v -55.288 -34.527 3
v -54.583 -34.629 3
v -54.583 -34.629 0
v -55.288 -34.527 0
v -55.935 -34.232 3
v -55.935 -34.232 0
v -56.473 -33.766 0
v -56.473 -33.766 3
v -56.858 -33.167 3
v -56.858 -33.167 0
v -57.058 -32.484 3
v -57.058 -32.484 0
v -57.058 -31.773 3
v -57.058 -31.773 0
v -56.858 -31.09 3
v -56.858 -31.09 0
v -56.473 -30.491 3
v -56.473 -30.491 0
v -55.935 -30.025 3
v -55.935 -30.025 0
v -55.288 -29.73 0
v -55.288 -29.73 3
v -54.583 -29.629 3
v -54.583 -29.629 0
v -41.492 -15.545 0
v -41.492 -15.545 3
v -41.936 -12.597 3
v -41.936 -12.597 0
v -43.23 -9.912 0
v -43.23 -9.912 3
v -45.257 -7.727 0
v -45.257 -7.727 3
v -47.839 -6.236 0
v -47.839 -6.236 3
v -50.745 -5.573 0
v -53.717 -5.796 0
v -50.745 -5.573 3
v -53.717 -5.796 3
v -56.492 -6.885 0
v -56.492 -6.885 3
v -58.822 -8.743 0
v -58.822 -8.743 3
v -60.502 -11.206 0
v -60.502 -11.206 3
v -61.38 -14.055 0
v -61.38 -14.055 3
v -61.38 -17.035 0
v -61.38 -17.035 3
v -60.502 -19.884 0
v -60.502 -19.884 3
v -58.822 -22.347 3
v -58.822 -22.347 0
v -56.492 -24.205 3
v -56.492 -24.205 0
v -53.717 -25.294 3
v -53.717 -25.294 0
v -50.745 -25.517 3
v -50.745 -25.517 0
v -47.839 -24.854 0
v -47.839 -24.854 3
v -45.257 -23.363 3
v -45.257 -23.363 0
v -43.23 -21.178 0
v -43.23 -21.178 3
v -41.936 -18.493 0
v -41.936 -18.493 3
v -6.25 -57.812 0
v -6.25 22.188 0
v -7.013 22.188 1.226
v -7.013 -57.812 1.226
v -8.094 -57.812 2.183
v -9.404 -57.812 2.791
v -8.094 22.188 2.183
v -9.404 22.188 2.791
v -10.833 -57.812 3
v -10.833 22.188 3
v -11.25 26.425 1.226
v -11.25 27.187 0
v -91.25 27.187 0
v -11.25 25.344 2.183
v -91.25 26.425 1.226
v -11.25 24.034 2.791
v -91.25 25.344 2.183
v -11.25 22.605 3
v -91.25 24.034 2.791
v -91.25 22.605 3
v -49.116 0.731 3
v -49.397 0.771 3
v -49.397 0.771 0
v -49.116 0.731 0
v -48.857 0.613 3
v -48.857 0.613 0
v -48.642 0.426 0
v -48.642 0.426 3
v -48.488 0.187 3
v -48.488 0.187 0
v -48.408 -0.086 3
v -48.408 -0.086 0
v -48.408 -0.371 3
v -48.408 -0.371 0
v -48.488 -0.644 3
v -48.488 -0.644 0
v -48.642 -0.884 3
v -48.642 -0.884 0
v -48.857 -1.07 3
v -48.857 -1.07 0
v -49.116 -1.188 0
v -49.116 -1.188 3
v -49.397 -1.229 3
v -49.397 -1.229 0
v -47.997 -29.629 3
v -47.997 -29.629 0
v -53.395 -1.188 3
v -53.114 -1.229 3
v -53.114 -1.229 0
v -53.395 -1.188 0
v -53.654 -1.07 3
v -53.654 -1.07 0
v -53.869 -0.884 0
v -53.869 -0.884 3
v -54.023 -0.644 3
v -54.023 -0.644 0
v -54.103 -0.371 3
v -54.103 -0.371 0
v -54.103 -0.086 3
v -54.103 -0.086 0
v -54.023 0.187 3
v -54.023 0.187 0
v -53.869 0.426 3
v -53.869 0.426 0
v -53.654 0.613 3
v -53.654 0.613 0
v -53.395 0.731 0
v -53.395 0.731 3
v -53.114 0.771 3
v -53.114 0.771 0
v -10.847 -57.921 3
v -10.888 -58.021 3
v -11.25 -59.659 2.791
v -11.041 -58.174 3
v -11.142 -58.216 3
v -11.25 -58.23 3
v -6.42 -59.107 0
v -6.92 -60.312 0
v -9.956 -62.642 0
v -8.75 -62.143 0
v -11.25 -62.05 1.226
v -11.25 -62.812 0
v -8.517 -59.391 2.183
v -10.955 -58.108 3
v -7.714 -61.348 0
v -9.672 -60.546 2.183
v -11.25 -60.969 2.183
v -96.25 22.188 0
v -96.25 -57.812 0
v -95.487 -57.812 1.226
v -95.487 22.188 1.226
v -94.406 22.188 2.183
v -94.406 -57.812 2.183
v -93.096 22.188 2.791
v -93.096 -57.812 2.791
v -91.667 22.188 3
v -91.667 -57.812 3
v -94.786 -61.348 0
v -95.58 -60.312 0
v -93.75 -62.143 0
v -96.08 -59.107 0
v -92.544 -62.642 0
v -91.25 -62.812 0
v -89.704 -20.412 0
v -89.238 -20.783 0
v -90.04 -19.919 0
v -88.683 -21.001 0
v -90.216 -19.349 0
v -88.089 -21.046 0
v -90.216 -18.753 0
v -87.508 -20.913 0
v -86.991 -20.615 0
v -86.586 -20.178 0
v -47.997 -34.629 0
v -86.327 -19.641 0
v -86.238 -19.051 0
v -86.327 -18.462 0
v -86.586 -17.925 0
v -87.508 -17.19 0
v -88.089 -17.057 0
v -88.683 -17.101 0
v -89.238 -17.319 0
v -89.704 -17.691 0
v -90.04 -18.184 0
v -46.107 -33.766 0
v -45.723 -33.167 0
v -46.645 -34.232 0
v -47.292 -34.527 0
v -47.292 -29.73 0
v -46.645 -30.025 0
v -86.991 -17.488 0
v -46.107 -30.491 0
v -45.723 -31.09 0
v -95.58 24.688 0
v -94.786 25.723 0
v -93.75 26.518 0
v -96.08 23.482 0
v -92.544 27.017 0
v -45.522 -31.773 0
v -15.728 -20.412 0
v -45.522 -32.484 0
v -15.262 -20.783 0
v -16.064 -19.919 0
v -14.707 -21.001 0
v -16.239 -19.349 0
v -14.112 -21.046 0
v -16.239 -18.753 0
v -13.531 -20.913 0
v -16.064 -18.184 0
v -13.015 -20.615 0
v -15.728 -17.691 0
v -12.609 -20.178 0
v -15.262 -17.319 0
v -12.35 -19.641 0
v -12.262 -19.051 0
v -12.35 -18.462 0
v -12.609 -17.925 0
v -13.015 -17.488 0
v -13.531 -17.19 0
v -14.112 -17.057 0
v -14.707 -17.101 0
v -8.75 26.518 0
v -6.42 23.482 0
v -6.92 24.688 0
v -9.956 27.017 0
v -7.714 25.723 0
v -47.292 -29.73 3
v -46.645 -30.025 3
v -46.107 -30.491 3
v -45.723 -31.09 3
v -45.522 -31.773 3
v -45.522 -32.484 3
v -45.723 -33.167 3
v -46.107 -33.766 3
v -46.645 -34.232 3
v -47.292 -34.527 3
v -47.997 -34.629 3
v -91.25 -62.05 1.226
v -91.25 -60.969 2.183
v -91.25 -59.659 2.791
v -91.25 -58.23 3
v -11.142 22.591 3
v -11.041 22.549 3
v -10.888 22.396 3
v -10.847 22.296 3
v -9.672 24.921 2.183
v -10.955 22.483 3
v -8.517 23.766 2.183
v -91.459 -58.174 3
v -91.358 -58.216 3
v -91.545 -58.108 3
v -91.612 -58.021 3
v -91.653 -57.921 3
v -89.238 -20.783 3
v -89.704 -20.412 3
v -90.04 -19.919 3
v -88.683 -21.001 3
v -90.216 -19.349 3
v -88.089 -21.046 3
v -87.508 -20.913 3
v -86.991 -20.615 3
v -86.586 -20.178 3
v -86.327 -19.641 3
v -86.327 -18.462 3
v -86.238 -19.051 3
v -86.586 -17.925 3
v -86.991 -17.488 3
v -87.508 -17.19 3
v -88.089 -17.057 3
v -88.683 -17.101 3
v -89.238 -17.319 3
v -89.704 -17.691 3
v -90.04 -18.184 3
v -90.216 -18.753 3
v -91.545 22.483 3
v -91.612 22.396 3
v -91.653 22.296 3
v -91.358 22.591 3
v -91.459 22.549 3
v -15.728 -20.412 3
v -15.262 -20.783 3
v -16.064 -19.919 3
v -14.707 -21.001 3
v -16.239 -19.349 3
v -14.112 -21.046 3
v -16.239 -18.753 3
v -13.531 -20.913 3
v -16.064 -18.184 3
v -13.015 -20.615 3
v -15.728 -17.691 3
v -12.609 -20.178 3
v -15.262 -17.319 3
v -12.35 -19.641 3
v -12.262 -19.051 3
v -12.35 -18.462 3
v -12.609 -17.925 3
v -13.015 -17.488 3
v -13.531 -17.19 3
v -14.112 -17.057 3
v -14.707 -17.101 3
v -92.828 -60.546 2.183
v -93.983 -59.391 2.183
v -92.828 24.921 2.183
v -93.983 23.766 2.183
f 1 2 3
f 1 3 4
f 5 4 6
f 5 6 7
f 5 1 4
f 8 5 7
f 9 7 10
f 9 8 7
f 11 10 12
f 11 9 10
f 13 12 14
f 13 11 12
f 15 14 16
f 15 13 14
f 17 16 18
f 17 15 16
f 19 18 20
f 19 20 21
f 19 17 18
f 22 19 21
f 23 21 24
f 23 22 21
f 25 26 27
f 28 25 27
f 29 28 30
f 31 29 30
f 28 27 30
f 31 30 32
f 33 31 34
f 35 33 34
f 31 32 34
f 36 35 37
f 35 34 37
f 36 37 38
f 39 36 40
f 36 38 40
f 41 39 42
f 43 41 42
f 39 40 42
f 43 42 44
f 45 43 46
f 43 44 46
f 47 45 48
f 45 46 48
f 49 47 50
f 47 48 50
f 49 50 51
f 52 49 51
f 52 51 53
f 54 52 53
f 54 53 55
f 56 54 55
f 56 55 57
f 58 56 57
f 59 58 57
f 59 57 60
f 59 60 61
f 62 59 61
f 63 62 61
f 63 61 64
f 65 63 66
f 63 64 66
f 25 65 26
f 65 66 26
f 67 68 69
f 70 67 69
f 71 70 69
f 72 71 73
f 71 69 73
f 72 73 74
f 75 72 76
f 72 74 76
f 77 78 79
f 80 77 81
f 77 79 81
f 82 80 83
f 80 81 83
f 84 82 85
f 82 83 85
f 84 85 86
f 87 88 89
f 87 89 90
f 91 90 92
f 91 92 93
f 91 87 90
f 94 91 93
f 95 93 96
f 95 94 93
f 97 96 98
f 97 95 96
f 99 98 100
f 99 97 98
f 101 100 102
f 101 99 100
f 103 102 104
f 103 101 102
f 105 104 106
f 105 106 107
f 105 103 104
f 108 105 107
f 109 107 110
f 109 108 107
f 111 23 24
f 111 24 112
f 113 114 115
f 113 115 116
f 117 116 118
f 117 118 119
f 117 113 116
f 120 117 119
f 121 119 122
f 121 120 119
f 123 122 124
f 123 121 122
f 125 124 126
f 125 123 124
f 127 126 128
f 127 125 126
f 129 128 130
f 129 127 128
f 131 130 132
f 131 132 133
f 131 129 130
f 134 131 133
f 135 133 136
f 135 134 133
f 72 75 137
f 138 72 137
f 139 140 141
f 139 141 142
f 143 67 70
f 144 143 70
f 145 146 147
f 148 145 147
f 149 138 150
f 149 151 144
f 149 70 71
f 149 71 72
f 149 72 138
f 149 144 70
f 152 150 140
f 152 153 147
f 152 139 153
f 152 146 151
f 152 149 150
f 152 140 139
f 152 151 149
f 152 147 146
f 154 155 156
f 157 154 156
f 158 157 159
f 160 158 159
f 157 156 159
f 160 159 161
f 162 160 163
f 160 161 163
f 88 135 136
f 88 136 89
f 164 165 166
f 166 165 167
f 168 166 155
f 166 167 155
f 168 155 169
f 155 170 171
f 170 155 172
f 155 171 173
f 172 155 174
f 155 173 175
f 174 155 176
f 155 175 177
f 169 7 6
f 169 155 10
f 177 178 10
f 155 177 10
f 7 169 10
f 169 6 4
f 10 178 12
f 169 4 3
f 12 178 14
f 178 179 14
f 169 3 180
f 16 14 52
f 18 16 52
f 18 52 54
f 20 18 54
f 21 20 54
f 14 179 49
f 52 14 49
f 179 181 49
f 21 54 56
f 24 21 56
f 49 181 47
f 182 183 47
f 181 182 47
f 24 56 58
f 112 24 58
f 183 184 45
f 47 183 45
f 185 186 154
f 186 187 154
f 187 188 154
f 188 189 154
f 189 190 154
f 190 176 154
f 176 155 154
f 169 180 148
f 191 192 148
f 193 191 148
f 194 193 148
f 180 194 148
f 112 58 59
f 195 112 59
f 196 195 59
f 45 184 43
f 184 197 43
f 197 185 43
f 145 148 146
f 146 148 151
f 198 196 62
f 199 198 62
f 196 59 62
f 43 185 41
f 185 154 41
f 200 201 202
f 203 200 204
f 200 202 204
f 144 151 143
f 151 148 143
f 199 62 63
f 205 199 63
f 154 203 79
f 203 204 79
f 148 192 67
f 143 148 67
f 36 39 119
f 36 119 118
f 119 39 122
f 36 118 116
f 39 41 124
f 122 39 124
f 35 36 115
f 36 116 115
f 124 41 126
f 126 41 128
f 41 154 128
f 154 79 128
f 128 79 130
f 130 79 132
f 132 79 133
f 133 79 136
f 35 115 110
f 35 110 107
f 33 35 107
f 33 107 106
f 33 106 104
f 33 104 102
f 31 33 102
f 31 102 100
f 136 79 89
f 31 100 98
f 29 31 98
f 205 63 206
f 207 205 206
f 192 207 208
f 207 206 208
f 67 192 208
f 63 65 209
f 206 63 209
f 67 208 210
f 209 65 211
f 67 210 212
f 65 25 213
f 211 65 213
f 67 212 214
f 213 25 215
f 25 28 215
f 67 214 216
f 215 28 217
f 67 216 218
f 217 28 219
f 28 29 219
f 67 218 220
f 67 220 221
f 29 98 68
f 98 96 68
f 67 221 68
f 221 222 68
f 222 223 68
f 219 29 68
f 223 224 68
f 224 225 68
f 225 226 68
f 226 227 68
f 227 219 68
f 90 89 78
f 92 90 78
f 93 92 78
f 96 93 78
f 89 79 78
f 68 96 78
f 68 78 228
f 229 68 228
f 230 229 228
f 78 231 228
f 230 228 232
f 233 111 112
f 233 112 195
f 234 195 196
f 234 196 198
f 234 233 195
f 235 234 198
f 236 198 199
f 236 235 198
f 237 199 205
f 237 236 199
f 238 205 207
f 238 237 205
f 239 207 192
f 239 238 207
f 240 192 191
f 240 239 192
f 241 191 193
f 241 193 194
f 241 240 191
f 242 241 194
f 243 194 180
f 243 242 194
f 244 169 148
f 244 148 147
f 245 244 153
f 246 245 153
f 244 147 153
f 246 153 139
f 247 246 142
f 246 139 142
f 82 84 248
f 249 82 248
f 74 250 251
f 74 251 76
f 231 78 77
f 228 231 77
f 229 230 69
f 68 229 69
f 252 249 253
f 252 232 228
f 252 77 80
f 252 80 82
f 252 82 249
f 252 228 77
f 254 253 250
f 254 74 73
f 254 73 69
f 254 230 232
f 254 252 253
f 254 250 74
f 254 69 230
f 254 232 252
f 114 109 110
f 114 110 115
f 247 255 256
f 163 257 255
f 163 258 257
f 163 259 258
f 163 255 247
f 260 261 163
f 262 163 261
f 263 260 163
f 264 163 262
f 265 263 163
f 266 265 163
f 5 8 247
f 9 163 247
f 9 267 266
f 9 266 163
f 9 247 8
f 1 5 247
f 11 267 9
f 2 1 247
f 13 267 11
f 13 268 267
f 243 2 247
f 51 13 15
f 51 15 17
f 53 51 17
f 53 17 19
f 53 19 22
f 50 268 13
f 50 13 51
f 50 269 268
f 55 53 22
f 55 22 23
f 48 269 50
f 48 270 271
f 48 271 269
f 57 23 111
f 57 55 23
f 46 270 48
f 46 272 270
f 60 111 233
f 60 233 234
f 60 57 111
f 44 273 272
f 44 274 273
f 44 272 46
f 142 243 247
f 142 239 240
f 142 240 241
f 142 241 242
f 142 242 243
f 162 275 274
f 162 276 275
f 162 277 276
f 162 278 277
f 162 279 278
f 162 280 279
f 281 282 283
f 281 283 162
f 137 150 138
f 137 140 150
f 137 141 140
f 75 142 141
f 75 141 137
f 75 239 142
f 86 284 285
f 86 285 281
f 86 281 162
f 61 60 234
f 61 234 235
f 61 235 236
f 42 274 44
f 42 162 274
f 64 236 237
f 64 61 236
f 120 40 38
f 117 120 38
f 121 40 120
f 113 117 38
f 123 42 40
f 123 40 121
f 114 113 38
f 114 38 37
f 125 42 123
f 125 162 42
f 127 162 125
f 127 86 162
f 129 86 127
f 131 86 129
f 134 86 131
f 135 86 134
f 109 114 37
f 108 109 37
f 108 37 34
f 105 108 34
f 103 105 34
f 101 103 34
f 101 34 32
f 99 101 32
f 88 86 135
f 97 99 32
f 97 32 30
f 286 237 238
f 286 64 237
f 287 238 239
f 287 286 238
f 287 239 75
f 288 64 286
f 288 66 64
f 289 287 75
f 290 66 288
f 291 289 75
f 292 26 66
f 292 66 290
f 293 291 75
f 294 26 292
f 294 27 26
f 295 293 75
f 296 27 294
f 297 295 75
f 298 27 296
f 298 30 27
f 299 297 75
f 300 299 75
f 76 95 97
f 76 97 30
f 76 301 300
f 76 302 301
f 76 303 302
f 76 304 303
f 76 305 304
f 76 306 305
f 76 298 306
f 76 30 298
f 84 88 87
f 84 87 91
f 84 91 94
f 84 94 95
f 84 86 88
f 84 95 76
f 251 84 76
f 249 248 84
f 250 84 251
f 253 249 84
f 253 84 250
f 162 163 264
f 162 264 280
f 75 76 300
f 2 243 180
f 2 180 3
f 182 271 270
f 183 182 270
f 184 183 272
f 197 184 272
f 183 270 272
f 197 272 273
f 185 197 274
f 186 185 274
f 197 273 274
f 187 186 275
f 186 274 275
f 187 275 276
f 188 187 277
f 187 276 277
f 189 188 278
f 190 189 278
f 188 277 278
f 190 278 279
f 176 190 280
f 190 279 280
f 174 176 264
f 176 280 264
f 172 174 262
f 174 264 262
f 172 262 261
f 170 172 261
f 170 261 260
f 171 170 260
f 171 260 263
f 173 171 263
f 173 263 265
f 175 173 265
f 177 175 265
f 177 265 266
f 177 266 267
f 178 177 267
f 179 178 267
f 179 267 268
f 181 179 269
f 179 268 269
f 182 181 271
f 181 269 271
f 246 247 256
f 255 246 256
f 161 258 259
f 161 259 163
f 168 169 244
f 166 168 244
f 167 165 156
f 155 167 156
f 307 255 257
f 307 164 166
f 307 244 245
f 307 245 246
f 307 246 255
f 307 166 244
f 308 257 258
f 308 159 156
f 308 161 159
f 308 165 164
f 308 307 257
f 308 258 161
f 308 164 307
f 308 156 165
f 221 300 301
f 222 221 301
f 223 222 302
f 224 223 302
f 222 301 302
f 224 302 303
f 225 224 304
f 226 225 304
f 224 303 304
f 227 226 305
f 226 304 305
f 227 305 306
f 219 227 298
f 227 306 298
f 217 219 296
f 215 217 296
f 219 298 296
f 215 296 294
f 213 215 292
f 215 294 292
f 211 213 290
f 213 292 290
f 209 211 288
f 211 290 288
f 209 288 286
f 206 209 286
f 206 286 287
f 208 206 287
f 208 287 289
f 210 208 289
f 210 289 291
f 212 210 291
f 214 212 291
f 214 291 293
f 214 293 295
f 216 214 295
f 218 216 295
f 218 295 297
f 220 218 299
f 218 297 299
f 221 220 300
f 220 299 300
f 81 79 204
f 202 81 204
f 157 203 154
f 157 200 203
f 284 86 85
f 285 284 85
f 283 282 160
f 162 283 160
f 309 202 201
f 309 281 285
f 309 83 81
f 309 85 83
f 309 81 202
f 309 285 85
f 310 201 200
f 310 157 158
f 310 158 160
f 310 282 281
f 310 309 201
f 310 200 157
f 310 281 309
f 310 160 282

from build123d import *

# Parameters (mm, degrees)
SKETCH1_W           = 90
SKETCH1_H           = 90
BOSS_EXTRUDE1_DEPTH = 3
FILLET1_R           = 5
FILLET3_R           = 5
SKETCH2_R           = 10
SKETCH2_R_2         = 2
CUT_EXTRUDE1_DEPTH  = 3


with BuildPart() as part:
    # Sketch1 → Boss-Extrude1 (new body)
    with BuildSketch(Plane.XY):
        with Locations((-51.25, -17.8125)):
            Rectangle(SKETCH1_W, SKETCH1_H)
    extrude(amount=BOSS_EXTRUDE1_DEPTH)

    # Fillet1
    fillet1_edges = [part.edges().sort_by_distance(p)[0] for p in [
        (-96.25, 27.1875, 1.5),
        (-6.25, 27.1875, 1.5),
        (-6.25, -62.8125, 1.5),
        (-96.25, -62.8125, 1.5),
    ]]
    fillet(fillet1_edges, radius=FILLET1_R)

    # Fillet3
    # the kernel refuses this fillet: 5 mm, written as the material it takes off along each edge
    with BuildSketch(Plane(origin=(-91.25, 22.1875, 3), x_dir=(0, 1, 0), z_dir=(1, 0, 0))) as fillet3_piece_1:
        with BuildLine():
            CenterArc((0.417424305, -5), FILLET3_R, 23.578178478, 66.421821522)
            Line((0.417424305, 0), (0.417424305, 0.1))
            Line((0.417424305, 0.1), (5, 0.1))
            Line((5, 0.1), (5.1, 0))
            ThreePointArc((5.1, 0), (5.1, -1.5), (5.091651514, -2.96))
            Line((5.091651514, -2.96), (5, -3))
        make_face()
    revolve(axis=Axis((-91.25, 22.1875, 3), (0, 0, 1)), revolution_arc=90, mode=Mode.SUBTRACT)
    with BuildSketch(Plane(origin=(-91.25, 27.1875, 3), x_dir=(0, 0, -1), z_dir=(1, 0, 0))) as fillet3_piece_2:
        with BuildLine():
            CenterArc((5, -4.582575695), FILLET3_R, 113.578178478, 66.421821522)
            Line((0, -4.582575695), (-0.1, -4.582575695))
            Line((-0.1, -4.582575695), (-0.1, 0))
            Line((-0.1, 0), (0, 0.1))
            ThreePointArc((0, 0.1), (1.5, 0.1), (2.96, 0.091651514))
            Line((2.96, 0.091651514), (3, 0))
        make_face()
    extrude(amount=80, mode=Mode.SUBTRACT)
    with BuildSketch(Plane(origin=(-11.25, 22.1875, 3), x_dir=(0, 1, 0), z_dir=(-1, 0, 0))) as fillet3_piece_3:
        with BuildLine():
            CenterArc((0.417424305, 5), FILLET3_R, 270, 66.421821522)
            Line((0.417424305, 0), (0.417424305, -0.1))
            Line((0.417424305, -0.1), (5, -0.1))
            Line((5, -0.1), (5.1, 0))
            ThreePointArc((5.1, 0), (5.1, 1.5), (5.091651514, 2.96))
            Line((5.091651514, 2.96), (5, 3))
        make_face()
    revolve(axis=Axis((-11.25, 22.1875, 3), (0, 0, -1)), revolution_arc=90, mode=Mode.SUBTRACT)
    with BuildSketch(Plane(origin=(-6.25, 22.1875, 3), x_dir=(-1, 0, 0), z_dir=(0, -1, 0)), Plane(origin=(-11.25, -62.8125, 3), x_dir=(0, 1, 0), z_dir=(-1, 0, 0)), Plane(origin=(-96.25, -57.8125, 3), x_dir=(1, 0, 0), z_dir=(0, 1, 0))) as fillet3_piece_4:
        with BuildLine():
            CenterArc((4.582575695, 5), FILLET3_R, 203.578178478, 66.421821522)
            Line((0, 3), (-0.091651514, 2.96))
            ThreePointArc((-0.091651514, 2.96), (-0.1, 1.5), (-0.1, 0))
            Line((-0.1, 0), (0, -0.1))
            Line((0, -0.1), (4.582575695, -0.1))
            Line((4.582575695, -0.1), (4.582575695, 0))
        make_face()
    extrude(amount=80, mode=Mode.SUBTRACT)
    with BuildSketch(Plane(origin=(-11.25, -57.8125, 3), x_dir=(1, 0, 0), z_dir=(0, 1, 0))) as fillet3_piece_5:
        with BuildLine():
            CenterArc((0.417424305, 5), FILLET3_R, 270, 66.421821522)
            Line((5, 3), (5.091651514, 2.96))
            ThreePointArc((5.091651514, 2.96), (5.1, 1.5), (5.1, 0))
            Line((5.1, 0), (5, -0.1))
            Line((5, -0.1), (0.417424305, -0.1))
            Line((0.417424305, -0.1), (0.417424305, 0))
        make_face()
    revolve(axis=Axis((-11.25, -57.8125, 3), (0, 0, -1)), revolution_arc=90, mode=Mode.SUBTRACT)
    with BuildSketch(Plane(origin=(-91.25, -57.8125, 3), x_dir=(0, -1, 0), z_dir=(1, 0, 0))) as fillet3_piece_6:
        with BuildLine():
            CenterArc((0.417424305, 5), FILLET3_R, 270, 66.421821522)
            Line((5, 3), (5.091651514, 2.96))
            ThreePointArc((5.091651514, 2.96), (5.1, 1.5), (5.1, 0))
            Line((5.1, 0), (5, -0.1))
            Line((5, -0.1), (0.417424305, -0.1))
            Line((0.417424305, -0.1), (0.417424305, 0))
        make_face()
    revolve(axis=Axis((-91.25, -57.8125, 3), (0, 0, -1)), revolution_arc=90, mode=Mode.SUBTRACT)

    # Sketch2 → Cut-Extrude1 (cut)
    with BuildSketch(Plane.XY.offset(3)):
        with Locations((-51.491961851, -15.545023704)):
            Circle(SKETCH2_R)
        with Locations((-88.238370767, -19.051344954)):
            Circle(SKETCH2_R_2)
        with Locations((-14.261629233, -19.051344954)):
            Circle(SKETCH2_R_2)
        with BuildLine():
            Line((-54.583479712, -29.628619656), (-47.996622456, -29.628619656))
            ThreePointArc((-47.996622456, -29.628619656), (-45.496622456, -32.128619656), (-47.996622456, -34.628619656))
            Line((-47.996622456, -34.628619656), (-54.583479712, -34.628619656))
            ThreePointArc((-54.583479712, -34.628619656), (-57.083479712, -32.128619656), (-54.583479712, -29.628619656))
        make_face()
        with BuildLine():
            Line((-53.113614206, 0.771303592), (-49.397460357, 0.771303592))
            ThreePointArc((-49.397460357, 0.771303592), (-48.397460357, -0.228696408), (-49.397460357, -1.228696408))
            Line((-49.397460357, -1.228696408), (-53.113614206, -1.228696408))
            ThreePointArc((-53.113614206, -1.228696408), (-54.113614206, -0.228696408), (-53.113614206, 0.771303592))
        make_face()
    extrude(amount=-CUT_EXTRUDE1_DEPTH, mode=Mode.SUBTRACT)


solid = part.part
